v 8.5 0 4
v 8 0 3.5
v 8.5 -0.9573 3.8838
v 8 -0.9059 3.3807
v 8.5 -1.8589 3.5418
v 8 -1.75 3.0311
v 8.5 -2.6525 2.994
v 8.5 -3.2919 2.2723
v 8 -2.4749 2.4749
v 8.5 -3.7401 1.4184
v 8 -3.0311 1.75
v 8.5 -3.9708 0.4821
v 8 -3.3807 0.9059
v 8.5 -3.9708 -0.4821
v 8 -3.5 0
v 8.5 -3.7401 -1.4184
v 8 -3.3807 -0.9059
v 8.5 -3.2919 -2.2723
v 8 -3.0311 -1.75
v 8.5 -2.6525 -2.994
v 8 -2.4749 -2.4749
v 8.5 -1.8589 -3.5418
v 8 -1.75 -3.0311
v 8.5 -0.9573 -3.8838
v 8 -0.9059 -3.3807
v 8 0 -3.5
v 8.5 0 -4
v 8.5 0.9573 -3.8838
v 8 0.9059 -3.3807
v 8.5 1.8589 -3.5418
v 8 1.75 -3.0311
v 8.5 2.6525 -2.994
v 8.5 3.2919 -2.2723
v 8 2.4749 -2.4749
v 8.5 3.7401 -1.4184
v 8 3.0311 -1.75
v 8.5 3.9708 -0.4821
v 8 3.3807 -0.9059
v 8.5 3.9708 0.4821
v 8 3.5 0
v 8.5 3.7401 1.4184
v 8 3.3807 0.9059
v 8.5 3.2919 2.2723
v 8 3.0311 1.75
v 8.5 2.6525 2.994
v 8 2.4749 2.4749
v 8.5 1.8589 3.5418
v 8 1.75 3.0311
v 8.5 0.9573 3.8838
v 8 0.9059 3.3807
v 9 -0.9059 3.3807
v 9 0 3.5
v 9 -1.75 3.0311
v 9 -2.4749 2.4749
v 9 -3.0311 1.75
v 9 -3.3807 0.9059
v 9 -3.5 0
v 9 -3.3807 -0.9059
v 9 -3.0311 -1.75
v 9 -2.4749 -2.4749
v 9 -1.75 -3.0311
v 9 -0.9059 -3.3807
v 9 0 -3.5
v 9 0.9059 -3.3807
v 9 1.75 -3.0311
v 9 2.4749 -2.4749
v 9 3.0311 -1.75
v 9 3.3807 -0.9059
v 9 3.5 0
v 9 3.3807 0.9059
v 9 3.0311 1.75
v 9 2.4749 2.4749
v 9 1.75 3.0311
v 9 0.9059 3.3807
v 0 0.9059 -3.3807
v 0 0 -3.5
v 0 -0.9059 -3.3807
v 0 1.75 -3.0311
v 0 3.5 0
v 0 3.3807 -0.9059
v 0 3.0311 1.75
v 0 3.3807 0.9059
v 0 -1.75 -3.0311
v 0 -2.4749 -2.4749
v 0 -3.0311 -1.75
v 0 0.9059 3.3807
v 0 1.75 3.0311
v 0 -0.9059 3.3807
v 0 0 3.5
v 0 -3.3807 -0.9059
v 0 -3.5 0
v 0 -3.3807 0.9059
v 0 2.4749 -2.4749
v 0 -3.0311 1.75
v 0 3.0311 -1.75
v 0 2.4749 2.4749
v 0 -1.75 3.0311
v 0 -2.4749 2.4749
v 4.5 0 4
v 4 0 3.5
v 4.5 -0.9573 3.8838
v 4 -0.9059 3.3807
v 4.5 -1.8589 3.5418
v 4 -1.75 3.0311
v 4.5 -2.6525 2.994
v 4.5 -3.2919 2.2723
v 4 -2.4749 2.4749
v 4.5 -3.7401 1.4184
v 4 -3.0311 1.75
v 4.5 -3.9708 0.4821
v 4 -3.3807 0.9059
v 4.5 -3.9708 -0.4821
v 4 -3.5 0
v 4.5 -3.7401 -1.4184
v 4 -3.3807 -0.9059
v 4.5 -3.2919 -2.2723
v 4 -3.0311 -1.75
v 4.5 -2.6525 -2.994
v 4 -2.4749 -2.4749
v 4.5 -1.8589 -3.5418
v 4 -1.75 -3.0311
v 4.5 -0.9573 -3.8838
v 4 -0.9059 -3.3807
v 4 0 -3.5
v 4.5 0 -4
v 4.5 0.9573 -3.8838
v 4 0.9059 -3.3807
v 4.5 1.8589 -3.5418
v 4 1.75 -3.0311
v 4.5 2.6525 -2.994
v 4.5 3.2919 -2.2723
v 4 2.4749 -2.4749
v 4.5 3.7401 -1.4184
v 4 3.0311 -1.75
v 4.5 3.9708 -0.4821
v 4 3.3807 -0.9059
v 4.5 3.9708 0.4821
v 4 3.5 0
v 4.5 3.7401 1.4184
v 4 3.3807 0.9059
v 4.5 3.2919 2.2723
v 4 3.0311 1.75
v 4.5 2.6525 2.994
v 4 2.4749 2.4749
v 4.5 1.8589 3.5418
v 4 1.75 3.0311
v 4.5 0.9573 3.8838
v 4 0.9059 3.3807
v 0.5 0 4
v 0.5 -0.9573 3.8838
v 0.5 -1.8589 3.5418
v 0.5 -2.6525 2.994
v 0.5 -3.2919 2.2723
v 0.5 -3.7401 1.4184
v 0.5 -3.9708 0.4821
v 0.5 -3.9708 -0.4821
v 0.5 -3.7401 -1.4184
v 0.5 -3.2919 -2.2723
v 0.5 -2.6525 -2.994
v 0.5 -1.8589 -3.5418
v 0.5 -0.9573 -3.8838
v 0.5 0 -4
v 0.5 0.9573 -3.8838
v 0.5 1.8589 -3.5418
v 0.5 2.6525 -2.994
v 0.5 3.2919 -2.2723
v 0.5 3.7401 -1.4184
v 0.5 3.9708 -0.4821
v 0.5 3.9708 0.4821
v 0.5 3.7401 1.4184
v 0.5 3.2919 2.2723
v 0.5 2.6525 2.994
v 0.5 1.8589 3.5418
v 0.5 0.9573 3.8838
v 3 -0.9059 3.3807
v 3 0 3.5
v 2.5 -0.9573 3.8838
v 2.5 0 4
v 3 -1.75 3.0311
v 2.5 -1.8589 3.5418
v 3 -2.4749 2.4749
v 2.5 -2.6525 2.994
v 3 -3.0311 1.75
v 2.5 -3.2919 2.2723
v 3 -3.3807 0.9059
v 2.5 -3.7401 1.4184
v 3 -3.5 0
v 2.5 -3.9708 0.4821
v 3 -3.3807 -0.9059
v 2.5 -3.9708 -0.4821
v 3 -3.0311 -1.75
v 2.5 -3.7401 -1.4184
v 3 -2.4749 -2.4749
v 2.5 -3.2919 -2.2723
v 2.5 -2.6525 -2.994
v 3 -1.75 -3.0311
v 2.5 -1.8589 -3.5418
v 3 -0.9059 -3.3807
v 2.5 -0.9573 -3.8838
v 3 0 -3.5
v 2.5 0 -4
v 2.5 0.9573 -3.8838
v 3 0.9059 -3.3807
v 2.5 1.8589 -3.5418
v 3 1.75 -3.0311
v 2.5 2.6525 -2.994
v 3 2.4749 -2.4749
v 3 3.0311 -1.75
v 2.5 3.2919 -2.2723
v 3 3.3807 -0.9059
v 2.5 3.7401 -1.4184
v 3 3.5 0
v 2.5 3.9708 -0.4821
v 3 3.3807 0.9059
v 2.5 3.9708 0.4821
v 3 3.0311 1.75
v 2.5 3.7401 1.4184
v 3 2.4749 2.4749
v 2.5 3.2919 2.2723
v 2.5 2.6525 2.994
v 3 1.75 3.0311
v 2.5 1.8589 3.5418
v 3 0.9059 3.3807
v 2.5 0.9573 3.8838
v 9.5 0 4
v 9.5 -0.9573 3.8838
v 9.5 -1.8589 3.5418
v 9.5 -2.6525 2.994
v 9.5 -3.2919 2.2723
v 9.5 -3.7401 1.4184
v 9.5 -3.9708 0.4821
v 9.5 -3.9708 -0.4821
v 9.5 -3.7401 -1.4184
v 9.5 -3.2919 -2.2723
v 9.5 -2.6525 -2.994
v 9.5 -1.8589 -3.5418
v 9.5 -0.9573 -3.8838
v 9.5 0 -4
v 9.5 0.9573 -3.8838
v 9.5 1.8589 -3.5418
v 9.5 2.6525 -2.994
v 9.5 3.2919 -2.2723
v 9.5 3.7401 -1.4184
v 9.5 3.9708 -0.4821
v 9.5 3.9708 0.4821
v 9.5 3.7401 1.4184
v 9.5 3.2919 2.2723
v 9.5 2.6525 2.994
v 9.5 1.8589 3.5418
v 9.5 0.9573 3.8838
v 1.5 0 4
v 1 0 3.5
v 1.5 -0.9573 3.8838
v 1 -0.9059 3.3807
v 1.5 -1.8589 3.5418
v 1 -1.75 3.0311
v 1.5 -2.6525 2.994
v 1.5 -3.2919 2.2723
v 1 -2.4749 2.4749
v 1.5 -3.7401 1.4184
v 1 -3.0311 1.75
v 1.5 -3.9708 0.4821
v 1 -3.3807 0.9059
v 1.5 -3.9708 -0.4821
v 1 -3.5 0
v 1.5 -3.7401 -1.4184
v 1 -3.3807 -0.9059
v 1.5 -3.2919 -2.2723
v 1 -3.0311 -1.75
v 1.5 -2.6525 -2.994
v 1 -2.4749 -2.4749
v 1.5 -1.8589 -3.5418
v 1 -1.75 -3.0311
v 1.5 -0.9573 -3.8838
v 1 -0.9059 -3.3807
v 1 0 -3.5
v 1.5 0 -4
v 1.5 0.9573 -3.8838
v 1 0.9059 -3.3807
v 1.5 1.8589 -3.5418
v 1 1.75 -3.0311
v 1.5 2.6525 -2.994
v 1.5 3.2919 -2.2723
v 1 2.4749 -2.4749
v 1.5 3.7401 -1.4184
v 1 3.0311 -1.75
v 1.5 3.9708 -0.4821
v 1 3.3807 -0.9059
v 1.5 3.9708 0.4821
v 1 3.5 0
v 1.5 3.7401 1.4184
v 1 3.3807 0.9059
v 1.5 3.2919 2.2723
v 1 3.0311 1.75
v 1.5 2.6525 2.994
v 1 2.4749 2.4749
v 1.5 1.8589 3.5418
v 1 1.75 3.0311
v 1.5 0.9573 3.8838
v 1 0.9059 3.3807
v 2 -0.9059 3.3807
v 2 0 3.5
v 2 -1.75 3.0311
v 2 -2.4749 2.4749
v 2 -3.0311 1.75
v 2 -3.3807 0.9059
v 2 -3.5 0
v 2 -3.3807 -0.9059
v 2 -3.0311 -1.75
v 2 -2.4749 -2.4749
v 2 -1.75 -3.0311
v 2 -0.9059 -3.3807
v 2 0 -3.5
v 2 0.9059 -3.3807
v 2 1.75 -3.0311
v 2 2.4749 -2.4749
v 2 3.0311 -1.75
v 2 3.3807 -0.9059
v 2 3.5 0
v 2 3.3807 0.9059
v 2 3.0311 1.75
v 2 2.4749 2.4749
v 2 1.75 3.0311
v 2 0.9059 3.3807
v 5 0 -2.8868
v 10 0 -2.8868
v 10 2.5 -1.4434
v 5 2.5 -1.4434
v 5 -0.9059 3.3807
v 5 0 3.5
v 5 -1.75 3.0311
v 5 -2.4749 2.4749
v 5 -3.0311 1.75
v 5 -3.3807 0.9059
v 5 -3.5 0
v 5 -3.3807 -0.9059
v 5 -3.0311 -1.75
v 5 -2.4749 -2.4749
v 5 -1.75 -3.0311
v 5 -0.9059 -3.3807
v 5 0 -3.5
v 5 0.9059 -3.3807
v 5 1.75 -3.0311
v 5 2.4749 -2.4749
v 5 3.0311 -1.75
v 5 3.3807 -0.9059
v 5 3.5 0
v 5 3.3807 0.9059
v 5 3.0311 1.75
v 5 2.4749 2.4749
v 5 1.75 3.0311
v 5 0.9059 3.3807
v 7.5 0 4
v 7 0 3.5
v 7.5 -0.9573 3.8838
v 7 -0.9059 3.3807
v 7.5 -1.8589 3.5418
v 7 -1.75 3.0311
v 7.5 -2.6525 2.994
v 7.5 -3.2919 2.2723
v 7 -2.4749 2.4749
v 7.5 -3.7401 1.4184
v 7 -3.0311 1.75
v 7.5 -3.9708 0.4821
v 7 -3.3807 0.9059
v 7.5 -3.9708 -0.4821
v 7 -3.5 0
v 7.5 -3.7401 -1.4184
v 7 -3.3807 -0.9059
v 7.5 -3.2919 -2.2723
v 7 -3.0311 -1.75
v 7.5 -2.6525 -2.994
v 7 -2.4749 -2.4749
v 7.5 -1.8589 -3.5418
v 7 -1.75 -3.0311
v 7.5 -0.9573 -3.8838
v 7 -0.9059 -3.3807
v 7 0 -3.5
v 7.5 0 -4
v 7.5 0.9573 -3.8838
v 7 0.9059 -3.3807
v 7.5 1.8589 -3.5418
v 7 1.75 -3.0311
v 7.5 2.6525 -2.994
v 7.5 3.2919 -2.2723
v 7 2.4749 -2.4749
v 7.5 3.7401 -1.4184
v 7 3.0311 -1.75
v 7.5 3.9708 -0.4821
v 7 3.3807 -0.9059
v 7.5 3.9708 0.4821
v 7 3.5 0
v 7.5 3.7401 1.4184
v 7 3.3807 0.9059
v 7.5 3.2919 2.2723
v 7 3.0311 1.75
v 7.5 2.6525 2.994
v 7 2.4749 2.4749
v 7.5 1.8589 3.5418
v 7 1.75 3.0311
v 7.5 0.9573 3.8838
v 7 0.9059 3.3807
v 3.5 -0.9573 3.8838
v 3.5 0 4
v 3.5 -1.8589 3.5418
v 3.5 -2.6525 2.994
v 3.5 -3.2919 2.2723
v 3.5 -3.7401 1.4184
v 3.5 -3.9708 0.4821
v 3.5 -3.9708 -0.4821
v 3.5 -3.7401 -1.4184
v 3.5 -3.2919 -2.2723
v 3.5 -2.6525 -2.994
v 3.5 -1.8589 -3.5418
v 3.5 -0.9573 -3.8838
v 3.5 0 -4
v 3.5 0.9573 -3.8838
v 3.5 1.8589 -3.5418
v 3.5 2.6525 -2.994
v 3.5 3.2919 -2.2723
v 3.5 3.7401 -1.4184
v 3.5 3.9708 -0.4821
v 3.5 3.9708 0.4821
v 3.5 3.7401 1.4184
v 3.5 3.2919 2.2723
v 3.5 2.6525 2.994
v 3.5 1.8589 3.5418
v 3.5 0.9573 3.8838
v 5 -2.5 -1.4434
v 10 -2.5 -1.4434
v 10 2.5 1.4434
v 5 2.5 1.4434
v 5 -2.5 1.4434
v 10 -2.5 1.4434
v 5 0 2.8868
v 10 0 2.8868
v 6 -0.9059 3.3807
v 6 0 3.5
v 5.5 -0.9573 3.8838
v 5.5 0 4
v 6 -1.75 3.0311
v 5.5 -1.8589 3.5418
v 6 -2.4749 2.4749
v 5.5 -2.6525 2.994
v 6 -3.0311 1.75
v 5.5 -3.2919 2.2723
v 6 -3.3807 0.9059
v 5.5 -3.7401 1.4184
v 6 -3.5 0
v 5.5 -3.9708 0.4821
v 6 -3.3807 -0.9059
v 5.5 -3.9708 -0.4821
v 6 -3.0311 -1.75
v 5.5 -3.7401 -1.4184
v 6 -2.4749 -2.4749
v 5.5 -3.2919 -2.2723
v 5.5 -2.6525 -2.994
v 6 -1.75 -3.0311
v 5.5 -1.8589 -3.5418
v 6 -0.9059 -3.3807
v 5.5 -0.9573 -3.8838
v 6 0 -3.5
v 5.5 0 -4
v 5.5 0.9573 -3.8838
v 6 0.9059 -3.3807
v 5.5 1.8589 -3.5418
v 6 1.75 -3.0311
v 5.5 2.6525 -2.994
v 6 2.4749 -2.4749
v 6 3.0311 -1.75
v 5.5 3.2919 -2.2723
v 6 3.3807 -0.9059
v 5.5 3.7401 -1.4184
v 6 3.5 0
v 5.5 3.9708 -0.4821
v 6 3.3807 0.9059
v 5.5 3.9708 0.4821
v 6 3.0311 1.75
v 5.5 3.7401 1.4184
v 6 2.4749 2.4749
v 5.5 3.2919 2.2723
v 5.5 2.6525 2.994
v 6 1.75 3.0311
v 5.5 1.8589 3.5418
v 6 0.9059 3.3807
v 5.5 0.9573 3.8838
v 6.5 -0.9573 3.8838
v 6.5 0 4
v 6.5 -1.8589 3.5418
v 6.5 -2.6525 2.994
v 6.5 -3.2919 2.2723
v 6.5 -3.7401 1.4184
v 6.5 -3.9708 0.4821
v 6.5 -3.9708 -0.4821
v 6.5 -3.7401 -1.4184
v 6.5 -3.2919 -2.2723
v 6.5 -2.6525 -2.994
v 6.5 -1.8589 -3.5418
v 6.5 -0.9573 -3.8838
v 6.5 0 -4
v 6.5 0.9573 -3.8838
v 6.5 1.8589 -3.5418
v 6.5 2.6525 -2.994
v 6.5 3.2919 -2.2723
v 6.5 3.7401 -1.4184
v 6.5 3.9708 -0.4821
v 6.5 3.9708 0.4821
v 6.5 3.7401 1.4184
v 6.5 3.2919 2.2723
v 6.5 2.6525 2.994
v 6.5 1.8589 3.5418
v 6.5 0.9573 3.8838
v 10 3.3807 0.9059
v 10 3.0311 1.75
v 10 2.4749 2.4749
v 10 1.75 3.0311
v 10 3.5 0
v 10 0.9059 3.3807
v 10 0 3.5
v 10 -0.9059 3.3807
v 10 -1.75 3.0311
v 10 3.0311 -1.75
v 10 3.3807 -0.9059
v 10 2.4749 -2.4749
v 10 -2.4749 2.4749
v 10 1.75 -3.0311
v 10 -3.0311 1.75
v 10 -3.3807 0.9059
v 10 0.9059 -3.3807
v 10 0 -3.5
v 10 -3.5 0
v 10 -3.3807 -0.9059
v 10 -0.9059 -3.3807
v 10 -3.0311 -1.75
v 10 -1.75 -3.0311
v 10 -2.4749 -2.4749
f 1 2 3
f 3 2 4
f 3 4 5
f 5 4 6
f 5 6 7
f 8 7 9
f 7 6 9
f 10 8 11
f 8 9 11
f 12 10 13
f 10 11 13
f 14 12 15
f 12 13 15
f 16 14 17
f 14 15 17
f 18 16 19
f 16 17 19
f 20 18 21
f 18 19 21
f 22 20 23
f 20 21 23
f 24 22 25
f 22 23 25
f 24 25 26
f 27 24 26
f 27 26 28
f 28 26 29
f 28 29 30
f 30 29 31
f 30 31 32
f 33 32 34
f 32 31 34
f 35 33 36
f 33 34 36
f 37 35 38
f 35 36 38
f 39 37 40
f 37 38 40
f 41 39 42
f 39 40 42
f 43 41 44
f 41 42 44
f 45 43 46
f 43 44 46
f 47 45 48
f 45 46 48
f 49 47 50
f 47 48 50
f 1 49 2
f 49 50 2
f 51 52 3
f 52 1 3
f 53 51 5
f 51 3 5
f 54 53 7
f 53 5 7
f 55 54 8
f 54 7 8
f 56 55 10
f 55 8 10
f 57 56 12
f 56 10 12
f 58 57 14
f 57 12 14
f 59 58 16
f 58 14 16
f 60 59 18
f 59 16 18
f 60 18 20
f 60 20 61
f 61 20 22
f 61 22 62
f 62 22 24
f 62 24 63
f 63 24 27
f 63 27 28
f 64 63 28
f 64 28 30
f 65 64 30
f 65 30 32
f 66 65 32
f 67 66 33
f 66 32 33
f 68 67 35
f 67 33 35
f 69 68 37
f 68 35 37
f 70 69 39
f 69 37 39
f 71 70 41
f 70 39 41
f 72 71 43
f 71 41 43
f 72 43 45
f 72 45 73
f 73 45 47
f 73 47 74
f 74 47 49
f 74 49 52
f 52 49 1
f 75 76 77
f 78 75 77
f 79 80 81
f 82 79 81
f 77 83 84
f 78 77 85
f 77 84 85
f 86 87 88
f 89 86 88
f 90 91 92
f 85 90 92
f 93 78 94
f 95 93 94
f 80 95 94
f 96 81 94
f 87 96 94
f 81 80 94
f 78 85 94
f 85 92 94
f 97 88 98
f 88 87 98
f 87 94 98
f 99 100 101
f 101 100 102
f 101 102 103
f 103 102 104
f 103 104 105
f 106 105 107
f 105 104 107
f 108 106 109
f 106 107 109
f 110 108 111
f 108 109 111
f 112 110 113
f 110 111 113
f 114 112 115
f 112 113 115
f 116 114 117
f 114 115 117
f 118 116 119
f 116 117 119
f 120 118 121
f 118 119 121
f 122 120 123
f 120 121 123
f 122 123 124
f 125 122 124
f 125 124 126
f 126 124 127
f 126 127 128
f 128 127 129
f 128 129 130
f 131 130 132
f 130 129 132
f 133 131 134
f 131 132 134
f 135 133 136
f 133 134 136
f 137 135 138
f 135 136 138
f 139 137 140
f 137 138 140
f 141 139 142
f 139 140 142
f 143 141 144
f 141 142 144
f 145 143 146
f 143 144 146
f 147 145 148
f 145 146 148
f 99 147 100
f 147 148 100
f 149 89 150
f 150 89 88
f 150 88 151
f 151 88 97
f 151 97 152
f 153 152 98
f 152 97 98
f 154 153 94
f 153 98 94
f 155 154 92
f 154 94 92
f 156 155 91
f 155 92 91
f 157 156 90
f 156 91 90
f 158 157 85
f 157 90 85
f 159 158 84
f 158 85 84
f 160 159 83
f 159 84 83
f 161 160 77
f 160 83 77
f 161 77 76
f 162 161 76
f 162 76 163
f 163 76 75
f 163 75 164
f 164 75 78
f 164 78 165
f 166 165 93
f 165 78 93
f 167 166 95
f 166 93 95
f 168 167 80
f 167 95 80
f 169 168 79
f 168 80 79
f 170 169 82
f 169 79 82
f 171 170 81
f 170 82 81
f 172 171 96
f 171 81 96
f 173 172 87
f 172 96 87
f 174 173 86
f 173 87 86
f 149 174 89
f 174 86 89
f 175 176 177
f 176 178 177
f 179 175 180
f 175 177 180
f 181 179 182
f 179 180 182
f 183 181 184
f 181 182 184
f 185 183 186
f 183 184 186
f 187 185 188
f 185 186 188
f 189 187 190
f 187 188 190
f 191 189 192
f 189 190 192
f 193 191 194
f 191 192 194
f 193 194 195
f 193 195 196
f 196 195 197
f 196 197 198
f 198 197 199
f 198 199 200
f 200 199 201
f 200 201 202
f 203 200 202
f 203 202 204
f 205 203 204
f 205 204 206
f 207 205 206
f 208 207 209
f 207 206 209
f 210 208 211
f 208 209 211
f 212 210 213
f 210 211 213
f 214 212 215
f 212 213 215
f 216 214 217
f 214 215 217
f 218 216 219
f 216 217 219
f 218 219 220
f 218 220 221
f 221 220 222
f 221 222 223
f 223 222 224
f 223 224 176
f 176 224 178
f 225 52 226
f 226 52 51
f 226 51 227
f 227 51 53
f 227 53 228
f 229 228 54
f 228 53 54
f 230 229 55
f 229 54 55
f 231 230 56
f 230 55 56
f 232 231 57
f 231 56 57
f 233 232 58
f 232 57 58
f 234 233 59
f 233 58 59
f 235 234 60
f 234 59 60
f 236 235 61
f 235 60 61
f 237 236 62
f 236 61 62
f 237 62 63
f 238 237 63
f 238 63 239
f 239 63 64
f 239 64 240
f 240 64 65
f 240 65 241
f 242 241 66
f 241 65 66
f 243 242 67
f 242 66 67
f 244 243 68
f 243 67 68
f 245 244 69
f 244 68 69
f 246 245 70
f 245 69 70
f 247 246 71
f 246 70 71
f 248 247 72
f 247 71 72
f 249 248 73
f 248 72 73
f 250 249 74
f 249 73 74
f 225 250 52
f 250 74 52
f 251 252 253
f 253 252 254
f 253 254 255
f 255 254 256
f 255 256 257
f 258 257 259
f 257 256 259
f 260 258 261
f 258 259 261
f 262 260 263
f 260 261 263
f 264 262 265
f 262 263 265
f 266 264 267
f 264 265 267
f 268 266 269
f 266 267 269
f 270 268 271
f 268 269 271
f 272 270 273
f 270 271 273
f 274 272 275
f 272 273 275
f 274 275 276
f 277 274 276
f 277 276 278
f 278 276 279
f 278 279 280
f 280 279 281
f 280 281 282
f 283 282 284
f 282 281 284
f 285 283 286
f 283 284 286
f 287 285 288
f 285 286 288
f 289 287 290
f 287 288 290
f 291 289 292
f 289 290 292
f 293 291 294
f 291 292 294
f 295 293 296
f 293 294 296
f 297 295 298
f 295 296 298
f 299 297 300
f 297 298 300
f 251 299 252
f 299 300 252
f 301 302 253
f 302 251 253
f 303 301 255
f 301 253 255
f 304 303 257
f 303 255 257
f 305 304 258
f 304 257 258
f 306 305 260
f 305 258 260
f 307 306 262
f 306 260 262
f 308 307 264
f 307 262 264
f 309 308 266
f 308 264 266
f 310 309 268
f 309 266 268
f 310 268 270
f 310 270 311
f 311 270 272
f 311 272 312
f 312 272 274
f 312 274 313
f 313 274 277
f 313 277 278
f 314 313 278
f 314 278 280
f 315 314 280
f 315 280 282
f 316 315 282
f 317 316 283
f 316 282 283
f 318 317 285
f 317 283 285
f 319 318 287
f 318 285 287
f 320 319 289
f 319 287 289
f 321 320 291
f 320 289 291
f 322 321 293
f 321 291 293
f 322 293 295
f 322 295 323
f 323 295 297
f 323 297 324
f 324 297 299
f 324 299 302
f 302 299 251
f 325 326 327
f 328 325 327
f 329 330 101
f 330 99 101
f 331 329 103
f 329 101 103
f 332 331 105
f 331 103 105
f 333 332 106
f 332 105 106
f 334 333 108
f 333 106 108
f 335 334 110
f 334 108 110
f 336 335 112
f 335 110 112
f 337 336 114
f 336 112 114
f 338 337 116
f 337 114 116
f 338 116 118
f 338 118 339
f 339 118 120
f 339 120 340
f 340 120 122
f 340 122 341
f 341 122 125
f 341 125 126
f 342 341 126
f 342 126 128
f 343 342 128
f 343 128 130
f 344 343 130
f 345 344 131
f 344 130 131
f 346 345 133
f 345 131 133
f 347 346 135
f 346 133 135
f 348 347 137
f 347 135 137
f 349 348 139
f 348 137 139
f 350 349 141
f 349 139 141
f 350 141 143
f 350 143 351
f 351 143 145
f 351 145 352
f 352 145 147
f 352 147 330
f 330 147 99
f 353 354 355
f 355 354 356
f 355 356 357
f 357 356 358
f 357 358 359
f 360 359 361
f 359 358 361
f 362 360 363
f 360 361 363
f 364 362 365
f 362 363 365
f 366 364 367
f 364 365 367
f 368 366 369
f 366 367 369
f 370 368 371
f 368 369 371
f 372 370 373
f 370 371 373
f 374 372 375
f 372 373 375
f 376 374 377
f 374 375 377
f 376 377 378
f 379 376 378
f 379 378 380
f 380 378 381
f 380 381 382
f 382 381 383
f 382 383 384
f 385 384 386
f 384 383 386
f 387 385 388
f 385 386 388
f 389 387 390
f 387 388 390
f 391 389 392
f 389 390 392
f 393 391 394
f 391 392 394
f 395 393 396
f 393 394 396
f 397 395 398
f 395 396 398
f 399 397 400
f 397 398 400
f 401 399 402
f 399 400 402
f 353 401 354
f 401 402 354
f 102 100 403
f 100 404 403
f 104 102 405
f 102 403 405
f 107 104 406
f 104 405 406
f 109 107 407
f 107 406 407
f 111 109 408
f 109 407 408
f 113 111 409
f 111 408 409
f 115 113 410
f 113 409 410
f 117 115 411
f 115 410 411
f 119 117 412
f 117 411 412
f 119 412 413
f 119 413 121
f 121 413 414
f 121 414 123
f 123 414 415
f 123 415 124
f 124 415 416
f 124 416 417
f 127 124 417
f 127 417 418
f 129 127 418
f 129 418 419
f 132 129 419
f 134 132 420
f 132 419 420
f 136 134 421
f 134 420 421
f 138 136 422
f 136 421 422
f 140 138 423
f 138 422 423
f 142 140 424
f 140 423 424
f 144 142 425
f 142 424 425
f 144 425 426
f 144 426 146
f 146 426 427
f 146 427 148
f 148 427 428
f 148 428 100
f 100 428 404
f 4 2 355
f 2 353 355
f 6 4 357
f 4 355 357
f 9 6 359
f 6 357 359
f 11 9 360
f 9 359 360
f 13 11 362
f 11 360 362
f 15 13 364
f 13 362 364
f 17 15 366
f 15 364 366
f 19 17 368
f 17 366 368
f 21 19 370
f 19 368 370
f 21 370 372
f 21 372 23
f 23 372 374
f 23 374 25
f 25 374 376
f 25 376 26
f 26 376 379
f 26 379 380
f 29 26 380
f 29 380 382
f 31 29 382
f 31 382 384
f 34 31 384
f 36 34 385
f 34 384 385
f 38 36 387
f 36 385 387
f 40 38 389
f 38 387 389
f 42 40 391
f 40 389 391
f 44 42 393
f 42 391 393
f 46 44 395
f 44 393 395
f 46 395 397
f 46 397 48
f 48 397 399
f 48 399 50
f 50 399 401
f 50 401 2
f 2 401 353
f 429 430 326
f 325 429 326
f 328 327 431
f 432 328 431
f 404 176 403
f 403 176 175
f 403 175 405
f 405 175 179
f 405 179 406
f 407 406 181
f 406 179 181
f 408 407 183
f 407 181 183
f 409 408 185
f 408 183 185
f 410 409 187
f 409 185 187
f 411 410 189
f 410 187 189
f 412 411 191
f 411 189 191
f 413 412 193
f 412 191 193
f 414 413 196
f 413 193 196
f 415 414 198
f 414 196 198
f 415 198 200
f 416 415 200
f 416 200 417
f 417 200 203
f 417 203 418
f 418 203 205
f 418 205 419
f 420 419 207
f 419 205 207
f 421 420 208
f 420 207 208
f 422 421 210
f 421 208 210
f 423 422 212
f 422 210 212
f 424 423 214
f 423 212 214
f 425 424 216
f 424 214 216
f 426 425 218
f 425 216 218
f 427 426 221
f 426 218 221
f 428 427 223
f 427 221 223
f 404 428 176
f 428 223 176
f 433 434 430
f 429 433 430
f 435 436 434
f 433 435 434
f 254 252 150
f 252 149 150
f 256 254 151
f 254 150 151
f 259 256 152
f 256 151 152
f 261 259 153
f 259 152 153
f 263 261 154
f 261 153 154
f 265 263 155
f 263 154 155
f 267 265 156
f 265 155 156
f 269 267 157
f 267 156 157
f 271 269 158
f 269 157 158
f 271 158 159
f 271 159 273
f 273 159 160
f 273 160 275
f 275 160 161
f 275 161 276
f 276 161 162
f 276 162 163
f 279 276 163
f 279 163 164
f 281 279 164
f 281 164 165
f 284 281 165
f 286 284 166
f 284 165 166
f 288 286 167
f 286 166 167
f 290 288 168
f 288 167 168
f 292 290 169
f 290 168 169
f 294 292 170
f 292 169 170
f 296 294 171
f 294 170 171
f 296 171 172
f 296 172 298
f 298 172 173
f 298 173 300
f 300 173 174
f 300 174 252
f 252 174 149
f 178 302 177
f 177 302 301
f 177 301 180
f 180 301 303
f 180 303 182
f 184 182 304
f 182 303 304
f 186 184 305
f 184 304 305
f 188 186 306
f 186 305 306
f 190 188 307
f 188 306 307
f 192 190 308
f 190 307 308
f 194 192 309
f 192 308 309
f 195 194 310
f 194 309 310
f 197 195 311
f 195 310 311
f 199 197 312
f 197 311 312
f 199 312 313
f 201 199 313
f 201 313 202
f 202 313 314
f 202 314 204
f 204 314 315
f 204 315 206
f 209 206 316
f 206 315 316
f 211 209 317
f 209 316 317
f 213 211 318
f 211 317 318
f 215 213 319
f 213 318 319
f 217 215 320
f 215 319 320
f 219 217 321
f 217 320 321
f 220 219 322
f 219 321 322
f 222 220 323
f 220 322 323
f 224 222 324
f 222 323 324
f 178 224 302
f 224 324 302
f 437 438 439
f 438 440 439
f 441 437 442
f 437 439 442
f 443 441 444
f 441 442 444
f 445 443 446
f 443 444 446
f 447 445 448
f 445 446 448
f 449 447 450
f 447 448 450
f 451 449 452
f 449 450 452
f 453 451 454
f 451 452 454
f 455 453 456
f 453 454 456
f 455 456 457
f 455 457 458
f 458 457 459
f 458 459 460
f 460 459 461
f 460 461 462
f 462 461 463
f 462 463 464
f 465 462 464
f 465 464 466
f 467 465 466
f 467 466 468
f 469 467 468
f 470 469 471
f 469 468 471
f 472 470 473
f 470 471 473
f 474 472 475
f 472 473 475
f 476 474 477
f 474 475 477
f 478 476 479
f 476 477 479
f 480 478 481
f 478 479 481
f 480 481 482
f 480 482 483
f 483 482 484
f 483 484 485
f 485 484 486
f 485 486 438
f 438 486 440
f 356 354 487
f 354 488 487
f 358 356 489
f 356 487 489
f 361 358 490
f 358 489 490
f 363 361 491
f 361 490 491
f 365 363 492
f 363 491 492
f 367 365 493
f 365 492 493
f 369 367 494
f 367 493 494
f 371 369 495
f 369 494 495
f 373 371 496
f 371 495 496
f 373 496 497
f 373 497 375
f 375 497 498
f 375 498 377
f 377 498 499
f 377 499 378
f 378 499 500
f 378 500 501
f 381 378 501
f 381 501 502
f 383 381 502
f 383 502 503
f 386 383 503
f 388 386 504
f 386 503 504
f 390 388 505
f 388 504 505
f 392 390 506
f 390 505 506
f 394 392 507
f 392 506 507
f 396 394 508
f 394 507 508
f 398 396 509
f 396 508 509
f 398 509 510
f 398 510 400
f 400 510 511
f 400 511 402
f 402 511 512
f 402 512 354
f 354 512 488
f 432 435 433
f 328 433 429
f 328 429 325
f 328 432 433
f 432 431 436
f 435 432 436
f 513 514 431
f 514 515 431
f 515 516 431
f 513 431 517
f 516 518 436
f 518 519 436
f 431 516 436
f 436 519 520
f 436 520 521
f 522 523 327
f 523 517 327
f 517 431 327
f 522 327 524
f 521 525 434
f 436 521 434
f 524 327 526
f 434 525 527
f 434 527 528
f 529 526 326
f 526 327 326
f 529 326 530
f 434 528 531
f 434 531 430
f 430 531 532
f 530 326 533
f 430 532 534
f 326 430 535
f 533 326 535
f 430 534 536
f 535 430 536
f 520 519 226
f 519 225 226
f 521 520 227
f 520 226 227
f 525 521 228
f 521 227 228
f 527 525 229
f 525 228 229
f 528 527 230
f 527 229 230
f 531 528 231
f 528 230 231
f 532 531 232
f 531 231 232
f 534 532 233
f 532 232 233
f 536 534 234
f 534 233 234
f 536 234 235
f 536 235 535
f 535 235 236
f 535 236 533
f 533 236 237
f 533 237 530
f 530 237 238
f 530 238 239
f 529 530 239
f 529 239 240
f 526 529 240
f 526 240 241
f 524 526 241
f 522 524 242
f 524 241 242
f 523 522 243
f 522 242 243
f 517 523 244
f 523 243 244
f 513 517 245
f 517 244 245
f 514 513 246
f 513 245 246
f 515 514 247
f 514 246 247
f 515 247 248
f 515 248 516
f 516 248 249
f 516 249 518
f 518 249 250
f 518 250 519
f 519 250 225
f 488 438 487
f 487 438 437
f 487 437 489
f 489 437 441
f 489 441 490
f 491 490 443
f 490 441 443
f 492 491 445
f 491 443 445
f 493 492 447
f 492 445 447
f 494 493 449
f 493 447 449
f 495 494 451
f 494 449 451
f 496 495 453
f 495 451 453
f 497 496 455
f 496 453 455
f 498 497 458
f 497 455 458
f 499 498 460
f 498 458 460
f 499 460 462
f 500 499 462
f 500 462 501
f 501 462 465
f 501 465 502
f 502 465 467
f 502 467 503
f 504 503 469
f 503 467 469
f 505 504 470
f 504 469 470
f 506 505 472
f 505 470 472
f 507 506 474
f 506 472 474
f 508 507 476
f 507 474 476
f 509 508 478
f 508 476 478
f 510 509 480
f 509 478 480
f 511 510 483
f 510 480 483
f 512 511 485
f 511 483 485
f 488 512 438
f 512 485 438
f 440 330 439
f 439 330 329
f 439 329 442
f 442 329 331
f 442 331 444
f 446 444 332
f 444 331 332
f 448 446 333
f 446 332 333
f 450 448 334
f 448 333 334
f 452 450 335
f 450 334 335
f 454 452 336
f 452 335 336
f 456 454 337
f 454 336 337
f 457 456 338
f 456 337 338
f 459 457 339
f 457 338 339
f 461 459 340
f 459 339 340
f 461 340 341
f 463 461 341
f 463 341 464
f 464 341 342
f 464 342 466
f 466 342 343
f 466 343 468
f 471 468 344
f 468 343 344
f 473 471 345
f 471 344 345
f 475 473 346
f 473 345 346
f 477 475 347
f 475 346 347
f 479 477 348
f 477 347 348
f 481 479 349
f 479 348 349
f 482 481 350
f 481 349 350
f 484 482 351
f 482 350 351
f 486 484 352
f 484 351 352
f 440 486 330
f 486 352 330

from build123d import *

# Parameters (mm, degrees)
CUT_EXTRUDE_1_DEPTH = 5


with BuildPart() as part:
    # 草图1 → 旋转1 (revolve)
    with BuildSketch(Plane.XY, mode=Mode.PRIVATE) as revolve_1_sk:
        Polygon((10, 0), (10, 3.5), (9.5, 4), (9, 3.5), (8.5, 4), (8, 3.5), (7.5, 4), (7, 3.5), (6.5, 4), (6, 3.5), (5.5, 4), (5, 3.5), (4.5, 4), (4, 3.5), (3.5, 4), (3, 3.5), (2.5, 4), (2, 3.5), (1.5, 4), (1, 3.5), (0.5, 4), (0, 3.5), (0, 0), align=None)
    revolve(revolve_1_sk.sketch.rotate(Axis((0.5, 0, 0), (1, 0, 0)), 90), axis=Axis((0.5, 0, 0), (1, 0, 0)))

    # 草图3 → 切除-拉伸1 (cut)
    with BuildSketch(Plane(origin=(10, 0, 0), x_dir=(0, 0, -1), z_dir=(1, 0, 0))):
        Polygon((2.886751346, 0), (1.443375673, 2.5), (-1.443375673, 2.5), (-2.886751346, 0), (-1.443375673, -2.5), (1.443375673, -2.5), align=None)
    extrude(amount=-CUT_EXTRUDE_1_DEPTH, mode=Mode.SUBTRACT)


solid = part.part
